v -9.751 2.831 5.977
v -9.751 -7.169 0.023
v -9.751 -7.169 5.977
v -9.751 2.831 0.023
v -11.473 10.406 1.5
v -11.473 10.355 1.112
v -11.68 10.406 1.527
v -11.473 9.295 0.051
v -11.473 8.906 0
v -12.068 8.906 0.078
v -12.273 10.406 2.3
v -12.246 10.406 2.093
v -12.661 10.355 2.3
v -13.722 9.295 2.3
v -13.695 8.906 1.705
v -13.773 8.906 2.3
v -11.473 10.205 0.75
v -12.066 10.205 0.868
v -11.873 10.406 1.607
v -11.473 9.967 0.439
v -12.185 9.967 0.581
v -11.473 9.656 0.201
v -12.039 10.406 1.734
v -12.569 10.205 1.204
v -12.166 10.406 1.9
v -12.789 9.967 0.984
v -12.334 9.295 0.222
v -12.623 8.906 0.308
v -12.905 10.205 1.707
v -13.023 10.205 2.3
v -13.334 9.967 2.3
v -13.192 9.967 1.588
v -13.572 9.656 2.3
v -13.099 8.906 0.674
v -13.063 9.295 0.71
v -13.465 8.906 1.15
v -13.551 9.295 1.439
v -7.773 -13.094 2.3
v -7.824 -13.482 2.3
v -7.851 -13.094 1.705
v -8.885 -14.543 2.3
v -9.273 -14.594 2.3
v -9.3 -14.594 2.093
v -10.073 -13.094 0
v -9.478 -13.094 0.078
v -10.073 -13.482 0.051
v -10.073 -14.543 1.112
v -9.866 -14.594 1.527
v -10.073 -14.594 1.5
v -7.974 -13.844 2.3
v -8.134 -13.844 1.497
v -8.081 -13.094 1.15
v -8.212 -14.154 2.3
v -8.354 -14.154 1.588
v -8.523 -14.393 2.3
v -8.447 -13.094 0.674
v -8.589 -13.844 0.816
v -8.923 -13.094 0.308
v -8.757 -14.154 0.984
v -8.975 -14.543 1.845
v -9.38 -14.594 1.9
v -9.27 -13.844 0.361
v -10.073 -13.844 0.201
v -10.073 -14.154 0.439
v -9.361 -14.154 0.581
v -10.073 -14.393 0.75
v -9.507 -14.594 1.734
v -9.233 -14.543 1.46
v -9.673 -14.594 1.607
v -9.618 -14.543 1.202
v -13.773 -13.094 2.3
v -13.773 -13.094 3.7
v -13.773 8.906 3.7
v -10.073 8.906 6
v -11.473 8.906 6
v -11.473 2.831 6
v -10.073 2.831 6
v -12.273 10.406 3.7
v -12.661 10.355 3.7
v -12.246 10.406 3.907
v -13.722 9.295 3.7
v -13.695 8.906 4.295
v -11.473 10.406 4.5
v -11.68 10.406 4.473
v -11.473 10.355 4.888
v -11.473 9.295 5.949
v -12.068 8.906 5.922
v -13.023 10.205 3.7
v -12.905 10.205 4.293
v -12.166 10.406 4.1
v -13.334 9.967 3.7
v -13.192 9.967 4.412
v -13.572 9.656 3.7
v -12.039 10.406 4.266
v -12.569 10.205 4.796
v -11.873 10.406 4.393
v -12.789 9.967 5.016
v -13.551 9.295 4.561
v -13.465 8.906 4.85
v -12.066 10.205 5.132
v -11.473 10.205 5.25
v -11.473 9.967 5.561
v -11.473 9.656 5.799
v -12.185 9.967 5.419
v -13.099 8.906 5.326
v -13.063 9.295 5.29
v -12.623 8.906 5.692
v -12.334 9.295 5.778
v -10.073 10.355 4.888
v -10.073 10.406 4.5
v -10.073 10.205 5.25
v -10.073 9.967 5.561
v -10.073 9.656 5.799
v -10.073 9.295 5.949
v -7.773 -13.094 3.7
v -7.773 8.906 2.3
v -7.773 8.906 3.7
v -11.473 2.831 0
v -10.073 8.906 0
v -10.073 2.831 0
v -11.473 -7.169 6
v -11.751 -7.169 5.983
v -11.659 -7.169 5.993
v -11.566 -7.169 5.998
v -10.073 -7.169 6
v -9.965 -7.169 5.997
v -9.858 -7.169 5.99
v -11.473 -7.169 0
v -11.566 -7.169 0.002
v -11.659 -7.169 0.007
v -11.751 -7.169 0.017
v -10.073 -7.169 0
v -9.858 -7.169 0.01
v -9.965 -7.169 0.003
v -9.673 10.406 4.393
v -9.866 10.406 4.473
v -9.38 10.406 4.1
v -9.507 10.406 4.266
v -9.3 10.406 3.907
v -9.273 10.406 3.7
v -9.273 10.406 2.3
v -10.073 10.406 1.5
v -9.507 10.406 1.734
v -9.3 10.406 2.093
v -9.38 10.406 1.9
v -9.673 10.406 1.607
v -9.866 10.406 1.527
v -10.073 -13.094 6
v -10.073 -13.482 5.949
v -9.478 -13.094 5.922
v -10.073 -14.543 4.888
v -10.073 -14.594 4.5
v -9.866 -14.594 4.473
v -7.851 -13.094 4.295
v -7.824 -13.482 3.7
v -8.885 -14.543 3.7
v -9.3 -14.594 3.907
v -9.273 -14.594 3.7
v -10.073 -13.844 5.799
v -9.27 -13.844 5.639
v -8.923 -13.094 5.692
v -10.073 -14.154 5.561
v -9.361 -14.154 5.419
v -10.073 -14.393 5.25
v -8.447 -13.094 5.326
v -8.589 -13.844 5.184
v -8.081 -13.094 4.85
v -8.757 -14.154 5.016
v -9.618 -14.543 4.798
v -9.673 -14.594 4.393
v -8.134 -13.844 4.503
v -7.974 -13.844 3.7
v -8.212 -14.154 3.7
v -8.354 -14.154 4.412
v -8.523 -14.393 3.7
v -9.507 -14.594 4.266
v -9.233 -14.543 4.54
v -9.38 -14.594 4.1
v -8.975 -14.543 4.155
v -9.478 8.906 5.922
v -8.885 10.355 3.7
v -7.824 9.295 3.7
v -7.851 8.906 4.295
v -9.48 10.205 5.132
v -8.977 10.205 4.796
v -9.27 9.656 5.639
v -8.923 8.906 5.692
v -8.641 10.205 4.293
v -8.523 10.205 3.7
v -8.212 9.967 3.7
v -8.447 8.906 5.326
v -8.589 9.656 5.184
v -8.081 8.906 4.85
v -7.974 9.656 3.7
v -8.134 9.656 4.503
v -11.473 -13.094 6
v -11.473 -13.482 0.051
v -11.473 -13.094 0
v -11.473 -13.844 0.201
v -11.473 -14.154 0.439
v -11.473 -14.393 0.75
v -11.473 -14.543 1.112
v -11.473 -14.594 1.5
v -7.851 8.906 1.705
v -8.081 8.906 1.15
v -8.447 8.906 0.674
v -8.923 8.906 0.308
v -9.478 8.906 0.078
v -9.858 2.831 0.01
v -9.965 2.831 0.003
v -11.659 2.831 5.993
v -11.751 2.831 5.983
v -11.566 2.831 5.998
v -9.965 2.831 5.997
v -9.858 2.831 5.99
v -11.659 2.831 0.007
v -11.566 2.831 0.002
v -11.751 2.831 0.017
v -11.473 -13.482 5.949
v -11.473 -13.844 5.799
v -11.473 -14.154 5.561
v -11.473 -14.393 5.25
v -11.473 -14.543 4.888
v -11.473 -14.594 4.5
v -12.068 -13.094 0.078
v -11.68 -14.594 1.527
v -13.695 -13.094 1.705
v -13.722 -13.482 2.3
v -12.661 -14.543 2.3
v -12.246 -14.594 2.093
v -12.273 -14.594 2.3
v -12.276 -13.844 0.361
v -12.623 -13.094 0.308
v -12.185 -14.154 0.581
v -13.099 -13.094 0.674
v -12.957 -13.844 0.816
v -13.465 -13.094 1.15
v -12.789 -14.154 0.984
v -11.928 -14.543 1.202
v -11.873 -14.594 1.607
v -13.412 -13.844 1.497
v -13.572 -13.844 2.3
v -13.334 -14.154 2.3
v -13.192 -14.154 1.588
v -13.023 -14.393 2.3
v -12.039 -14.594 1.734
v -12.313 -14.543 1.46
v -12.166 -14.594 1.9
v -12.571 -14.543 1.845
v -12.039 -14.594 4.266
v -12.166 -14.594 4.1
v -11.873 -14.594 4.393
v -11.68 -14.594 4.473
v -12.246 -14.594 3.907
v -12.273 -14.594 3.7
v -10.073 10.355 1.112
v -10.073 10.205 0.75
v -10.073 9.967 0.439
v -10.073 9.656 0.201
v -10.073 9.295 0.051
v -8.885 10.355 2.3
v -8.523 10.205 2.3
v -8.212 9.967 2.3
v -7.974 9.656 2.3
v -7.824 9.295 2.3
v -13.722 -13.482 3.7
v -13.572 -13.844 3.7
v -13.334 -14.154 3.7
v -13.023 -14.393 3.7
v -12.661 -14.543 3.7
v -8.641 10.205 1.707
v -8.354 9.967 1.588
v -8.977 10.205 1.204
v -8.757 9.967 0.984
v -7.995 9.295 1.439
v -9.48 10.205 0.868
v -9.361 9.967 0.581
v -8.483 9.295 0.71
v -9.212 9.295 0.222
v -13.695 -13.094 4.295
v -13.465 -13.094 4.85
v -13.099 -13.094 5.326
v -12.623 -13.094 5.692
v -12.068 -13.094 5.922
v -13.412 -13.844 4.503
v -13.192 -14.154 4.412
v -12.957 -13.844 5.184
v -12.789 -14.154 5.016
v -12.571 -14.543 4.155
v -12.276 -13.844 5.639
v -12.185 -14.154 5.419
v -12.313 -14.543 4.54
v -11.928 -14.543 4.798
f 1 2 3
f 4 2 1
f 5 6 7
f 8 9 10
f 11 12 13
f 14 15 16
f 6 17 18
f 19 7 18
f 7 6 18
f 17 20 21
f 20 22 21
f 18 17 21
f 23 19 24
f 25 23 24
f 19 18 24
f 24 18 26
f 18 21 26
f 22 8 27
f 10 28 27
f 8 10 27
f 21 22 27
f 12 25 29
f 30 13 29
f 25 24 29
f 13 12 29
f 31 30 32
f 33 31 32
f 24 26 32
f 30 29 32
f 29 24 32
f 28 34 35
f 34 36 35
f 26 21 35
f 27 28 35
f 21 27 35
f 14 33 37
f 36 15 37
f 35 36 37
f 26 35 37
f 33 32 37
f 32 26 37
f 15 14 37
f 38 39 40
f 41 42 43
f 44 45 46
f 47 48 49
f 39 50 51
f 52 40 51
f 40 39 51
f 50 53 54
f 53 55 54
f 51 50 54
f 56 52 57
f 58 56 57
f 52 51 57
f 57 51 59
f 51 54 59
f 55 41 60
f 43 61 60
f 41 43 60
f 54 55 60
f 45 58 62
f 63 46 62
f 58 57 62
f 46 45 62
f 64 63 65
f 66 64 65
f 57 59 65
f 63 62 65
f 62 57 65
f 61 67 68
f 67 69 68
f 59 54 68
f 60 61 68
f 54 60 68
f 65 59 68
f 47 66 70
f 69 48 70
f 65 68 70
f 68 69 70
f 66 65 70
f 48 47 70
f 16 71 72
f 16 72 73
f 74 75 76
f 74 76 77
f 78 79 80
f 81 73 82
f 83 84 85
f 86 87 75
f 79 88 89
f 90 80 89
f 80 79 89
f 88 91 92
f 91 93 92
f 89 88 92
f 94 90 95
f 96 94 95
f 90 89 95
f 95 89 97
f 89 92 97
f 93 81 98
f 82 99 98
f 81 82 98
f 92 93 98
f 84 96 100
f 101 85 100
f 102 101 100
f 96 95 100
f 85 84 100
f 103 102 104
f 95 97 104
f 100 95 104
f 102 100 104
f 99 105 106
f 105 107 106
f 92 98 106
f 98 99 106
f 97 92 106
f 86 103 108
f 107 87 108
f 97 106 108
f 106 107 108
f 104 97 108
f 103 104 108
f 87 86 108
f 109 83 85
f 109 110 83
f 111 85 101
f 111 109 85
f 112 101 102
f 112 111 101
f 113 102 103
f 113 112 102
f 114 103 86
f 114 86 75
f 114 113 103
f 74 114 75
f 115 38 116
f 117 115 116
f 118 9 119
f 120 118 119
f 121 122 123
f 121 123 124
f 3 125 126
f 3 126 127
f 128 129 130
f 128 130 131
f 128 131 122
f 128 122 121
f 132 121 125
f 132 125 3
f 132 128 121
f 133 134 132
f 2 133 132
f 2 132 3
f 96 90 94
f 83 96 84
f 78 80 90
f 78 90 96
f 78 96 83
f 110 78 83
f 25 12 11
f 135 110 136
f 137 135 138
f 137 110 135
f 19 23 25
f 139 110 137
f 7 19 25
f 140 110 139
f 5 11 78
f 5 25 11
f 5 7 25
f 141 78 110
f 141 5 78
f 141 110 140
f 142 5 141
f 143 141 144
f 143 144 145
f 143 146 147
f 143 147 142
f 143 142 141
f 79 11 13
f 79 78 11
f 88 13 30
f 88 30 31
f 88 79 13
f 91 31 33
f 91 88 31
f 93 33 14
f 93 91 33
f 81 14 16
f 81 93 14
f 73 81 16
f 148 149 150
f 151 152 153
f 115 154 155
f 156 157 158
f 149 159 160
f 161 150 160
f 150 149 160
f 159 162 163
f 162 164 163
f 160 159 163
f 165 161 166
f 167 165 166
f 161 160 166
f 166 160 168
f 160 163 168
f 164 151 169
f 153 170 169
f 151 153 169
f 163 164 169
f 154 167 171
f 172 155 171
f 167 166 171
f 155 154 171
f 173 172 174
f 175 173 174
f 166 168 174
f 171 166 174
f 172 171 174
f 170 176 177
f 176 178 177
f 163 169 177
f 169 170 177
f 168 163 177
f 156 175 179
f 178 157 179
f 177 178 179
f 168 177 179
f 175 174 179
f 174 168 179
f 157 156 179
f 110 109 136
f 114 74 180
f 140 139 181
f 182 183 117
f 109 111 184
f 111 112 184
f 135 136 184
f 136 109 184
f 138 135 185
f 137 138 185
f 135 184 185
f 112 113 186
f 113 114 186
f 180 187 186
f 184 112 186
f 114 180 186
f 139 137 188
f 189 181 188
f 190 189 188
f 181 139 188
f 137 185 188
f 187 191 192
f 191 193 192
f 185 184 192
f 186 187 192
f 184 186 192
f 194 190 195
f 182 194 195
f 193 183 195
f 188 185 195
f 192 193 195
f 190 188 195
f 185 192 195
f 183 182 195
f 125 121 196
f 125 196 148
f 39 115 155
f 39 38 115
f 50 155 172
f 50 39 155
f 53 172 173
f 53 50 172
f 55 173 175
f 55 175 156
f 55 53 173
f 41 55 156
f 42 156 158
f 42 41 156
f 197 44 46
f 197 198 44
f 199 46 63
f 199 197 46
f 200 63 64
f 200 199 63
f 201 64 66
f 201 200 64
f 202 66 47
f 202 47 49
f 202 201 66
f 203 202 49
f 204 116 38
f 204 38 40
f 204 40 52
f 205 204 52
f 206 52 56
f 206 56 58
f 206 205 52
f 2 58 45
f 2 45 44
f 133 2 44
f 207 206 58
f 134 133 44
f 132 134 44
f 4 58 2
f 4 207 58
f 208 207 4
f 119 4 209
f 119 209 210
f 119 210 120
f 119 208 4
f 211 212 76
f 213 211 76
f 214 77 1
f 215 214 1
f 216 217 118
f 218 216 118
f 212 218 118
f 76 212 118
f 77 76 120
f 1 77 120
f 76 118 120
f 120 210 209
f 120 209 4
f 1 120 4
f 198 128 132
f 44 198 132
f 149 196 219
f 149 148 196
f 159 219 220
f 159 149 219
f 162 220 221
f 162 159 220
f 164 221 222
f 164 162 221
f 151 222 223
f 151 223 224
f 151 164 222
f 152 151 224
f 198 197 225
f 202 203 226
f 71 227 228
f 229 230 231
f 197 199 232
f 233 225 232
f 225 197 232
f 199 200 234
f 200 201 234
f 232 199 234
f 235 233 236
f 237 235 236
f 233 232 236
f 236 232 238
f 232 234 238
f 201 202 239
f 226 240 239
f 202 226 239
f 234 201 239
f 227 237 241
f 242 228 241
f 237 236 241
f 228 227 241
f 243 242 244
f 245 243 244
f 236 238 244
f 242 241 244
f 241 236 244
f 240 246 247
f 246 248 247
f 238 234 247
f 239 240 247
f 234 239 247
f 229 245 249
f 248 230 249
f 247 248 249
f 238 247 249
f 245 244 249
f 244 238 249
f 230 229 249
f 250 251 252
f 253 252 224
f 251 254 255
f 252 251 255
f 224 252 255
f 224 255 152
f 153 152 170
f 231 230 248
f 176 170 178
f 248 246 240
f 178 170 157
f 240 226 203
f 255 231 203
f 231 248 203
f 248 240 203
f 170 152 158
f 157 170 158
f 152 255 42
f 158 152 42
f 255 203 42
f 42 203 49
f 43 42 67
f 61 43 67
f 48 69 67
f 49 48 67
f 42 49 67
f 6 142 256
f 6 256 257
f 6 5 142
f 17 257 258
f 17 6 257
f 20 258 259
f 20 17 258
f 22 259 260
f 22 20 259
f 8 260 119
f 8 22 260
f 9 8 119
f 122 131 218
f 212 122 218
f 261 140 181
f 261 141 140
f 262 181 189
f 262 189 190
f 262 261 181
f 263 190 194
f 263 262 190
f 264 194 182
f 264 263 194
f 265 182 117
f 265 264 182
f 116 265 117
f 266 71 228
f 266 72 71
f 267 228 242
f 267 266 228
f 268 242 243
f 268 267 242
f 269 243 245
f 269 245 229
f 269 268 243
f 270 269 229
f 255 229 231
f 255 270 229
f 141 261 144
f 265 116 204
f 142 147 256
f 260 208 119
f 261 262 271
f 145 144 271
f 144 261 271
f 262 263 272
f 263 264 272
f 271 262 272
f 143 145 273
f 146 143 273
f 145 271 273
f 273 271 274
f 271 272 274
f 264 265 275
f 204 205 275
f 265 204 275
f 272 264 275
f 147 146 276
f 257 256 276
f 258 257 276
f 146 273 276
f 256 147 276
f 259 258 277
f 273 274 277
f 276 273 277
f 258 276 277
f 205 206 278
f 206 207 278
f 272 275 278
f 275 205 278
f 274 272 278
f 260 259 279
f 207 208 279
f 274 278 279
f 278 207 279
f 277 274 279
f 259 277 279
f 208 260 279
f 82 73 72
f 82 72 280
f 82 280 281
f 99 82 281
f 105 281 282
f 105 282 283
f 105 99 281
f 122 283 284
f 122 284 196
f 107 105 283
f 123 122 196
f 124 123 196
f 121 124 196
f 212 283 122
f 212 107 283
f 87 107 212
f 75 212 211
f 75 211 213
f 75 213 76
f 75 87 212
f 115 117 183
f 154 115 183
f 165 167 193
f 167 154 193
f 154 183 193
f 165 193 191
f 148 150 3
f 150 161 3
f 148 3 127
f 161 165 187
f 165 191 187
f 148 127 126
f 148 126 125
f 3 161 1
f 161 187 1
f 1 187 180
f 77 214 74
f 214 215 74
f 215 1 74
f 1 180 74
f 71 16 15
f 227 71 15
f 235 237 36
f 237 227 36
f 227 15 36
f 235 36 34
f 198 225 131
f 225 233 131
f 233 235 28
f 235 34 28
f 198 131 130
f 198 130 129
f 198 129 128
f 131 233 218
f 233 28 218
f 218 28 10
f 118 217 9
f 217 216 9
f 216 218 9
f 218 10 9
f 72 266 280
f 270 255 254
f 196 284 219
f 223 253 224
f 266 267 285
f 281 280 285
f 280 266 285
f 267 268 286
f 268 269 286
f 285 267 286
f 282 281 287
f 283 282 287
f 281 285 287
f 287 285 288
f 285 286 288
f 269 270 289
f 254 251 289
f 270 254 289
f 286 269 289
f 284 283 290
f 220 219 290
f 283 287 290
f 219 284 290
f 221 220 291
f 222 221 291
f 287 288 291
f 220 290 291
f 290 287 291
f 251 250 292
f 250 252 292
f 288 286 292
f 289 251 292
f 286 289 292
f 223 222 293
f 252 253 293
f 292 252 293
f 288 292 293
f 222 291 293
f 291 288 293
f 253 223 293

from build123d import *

# Parameters (mm, degrees)
F0_W        = 6
F0_H        = 25
F0_W_2      = 2
F0_H_2      = 10
F1_DEPTH    = 6
F2_T1_DEPTH = 36.5
F3_R        = 1.5


# Not quite as in the source:
# - a fillet or chamfer that OpenCascade refuses, or shapes differently, is made with other operations: its cross-section is extruded or revolved along the edge and cut away or added


with BuildPart() as f1:
    # F0 (on Top) → F1 (new body)
    with BuildSketch(Plane.XY):
        with Locations((-10.7731075219, -2.0936969668)):
            Rectangle(F0_W, F0_H)
        with Locations((-10.7510519922, -2.1686129086)):
            Rectangle(F0_W_2, F0_H_2, mode=Mode.SUBTRACT)
    extrude(amount=F1_DEPTH)

    # F2: fillet of radius 2.3 on 4 edges, made by hand

    # F2_s2 → F2_t1 (cut)
    with BuildSketch(Plane.XZ.offset(-16.1563030332)):
        with BuildLine():
            ThreePointArc((-13.7731075219, 3.7), (-13.0994531186, 5.3263455967), (-11.4731075219, 6))
            Line((-11.4731075219, 6), (-13.7731075219, 6))
            Line((-13.7731075219, 6), (-13.7731075219, 3.7))
        make_face()
        with BuildLine():
            ThreePointArc((-13.7731075219, 2.3), (-13.0994531186, 0.6736544033), (-11.4731075219, 0))
            Line((-11.4731075219, 0), (-13.7731075219, 0))
            Line((-13.7731075219, 0), (-13.7731075219, 2.3))
        make_face()
        with BuildLine():
            ThreePointArc((-7.7731075219, 3.7), (-8.4467619252, 5.3263455967), (-10.0731075219, 6))
            Line((-10.0731075219, 6), (-7.7731075219, 6))
            Line((-7.7731075219, 6), (-7.7731075219, 3.7))
        make_face()
        with BuildLine():
            ThreePointArc((-7.7731075219, 2.3), (-8.4467619252, 0.6736544033), (-10.0731075219, 0))
            Line((-10.0731075219, 0), (-7.7731075219, 0))
            Line((-7.7731075219, 0), (-7.7731075219, 2.3))
        make_face()
    extrude(amount=F2_T1_DEPTH, mode=Mode.SUBTRACT)

    # F3
    f3_edges = [f1.edges().sort_by_distance(p)[0] for p in [
        (-8.446762, 10.406303, 5.326346),
        (-10.773108, 10.406303, 6),
        (-13.099453, 10.406303, 5.326346),
        (-13.773108, 10.406303, 3),
        (-13.099453, 10.406303, 0.673654),
        (-8.446762, 10.406303, 0.673654),
        (-7.773108, 10.406303, 3),
        (-10.773108, 10.406303, 0),
        (-13.099453, -14.593697, 0.673654),
    ]]
    fillet(f3_edges, radius=F3_R)


solid = f1.part
